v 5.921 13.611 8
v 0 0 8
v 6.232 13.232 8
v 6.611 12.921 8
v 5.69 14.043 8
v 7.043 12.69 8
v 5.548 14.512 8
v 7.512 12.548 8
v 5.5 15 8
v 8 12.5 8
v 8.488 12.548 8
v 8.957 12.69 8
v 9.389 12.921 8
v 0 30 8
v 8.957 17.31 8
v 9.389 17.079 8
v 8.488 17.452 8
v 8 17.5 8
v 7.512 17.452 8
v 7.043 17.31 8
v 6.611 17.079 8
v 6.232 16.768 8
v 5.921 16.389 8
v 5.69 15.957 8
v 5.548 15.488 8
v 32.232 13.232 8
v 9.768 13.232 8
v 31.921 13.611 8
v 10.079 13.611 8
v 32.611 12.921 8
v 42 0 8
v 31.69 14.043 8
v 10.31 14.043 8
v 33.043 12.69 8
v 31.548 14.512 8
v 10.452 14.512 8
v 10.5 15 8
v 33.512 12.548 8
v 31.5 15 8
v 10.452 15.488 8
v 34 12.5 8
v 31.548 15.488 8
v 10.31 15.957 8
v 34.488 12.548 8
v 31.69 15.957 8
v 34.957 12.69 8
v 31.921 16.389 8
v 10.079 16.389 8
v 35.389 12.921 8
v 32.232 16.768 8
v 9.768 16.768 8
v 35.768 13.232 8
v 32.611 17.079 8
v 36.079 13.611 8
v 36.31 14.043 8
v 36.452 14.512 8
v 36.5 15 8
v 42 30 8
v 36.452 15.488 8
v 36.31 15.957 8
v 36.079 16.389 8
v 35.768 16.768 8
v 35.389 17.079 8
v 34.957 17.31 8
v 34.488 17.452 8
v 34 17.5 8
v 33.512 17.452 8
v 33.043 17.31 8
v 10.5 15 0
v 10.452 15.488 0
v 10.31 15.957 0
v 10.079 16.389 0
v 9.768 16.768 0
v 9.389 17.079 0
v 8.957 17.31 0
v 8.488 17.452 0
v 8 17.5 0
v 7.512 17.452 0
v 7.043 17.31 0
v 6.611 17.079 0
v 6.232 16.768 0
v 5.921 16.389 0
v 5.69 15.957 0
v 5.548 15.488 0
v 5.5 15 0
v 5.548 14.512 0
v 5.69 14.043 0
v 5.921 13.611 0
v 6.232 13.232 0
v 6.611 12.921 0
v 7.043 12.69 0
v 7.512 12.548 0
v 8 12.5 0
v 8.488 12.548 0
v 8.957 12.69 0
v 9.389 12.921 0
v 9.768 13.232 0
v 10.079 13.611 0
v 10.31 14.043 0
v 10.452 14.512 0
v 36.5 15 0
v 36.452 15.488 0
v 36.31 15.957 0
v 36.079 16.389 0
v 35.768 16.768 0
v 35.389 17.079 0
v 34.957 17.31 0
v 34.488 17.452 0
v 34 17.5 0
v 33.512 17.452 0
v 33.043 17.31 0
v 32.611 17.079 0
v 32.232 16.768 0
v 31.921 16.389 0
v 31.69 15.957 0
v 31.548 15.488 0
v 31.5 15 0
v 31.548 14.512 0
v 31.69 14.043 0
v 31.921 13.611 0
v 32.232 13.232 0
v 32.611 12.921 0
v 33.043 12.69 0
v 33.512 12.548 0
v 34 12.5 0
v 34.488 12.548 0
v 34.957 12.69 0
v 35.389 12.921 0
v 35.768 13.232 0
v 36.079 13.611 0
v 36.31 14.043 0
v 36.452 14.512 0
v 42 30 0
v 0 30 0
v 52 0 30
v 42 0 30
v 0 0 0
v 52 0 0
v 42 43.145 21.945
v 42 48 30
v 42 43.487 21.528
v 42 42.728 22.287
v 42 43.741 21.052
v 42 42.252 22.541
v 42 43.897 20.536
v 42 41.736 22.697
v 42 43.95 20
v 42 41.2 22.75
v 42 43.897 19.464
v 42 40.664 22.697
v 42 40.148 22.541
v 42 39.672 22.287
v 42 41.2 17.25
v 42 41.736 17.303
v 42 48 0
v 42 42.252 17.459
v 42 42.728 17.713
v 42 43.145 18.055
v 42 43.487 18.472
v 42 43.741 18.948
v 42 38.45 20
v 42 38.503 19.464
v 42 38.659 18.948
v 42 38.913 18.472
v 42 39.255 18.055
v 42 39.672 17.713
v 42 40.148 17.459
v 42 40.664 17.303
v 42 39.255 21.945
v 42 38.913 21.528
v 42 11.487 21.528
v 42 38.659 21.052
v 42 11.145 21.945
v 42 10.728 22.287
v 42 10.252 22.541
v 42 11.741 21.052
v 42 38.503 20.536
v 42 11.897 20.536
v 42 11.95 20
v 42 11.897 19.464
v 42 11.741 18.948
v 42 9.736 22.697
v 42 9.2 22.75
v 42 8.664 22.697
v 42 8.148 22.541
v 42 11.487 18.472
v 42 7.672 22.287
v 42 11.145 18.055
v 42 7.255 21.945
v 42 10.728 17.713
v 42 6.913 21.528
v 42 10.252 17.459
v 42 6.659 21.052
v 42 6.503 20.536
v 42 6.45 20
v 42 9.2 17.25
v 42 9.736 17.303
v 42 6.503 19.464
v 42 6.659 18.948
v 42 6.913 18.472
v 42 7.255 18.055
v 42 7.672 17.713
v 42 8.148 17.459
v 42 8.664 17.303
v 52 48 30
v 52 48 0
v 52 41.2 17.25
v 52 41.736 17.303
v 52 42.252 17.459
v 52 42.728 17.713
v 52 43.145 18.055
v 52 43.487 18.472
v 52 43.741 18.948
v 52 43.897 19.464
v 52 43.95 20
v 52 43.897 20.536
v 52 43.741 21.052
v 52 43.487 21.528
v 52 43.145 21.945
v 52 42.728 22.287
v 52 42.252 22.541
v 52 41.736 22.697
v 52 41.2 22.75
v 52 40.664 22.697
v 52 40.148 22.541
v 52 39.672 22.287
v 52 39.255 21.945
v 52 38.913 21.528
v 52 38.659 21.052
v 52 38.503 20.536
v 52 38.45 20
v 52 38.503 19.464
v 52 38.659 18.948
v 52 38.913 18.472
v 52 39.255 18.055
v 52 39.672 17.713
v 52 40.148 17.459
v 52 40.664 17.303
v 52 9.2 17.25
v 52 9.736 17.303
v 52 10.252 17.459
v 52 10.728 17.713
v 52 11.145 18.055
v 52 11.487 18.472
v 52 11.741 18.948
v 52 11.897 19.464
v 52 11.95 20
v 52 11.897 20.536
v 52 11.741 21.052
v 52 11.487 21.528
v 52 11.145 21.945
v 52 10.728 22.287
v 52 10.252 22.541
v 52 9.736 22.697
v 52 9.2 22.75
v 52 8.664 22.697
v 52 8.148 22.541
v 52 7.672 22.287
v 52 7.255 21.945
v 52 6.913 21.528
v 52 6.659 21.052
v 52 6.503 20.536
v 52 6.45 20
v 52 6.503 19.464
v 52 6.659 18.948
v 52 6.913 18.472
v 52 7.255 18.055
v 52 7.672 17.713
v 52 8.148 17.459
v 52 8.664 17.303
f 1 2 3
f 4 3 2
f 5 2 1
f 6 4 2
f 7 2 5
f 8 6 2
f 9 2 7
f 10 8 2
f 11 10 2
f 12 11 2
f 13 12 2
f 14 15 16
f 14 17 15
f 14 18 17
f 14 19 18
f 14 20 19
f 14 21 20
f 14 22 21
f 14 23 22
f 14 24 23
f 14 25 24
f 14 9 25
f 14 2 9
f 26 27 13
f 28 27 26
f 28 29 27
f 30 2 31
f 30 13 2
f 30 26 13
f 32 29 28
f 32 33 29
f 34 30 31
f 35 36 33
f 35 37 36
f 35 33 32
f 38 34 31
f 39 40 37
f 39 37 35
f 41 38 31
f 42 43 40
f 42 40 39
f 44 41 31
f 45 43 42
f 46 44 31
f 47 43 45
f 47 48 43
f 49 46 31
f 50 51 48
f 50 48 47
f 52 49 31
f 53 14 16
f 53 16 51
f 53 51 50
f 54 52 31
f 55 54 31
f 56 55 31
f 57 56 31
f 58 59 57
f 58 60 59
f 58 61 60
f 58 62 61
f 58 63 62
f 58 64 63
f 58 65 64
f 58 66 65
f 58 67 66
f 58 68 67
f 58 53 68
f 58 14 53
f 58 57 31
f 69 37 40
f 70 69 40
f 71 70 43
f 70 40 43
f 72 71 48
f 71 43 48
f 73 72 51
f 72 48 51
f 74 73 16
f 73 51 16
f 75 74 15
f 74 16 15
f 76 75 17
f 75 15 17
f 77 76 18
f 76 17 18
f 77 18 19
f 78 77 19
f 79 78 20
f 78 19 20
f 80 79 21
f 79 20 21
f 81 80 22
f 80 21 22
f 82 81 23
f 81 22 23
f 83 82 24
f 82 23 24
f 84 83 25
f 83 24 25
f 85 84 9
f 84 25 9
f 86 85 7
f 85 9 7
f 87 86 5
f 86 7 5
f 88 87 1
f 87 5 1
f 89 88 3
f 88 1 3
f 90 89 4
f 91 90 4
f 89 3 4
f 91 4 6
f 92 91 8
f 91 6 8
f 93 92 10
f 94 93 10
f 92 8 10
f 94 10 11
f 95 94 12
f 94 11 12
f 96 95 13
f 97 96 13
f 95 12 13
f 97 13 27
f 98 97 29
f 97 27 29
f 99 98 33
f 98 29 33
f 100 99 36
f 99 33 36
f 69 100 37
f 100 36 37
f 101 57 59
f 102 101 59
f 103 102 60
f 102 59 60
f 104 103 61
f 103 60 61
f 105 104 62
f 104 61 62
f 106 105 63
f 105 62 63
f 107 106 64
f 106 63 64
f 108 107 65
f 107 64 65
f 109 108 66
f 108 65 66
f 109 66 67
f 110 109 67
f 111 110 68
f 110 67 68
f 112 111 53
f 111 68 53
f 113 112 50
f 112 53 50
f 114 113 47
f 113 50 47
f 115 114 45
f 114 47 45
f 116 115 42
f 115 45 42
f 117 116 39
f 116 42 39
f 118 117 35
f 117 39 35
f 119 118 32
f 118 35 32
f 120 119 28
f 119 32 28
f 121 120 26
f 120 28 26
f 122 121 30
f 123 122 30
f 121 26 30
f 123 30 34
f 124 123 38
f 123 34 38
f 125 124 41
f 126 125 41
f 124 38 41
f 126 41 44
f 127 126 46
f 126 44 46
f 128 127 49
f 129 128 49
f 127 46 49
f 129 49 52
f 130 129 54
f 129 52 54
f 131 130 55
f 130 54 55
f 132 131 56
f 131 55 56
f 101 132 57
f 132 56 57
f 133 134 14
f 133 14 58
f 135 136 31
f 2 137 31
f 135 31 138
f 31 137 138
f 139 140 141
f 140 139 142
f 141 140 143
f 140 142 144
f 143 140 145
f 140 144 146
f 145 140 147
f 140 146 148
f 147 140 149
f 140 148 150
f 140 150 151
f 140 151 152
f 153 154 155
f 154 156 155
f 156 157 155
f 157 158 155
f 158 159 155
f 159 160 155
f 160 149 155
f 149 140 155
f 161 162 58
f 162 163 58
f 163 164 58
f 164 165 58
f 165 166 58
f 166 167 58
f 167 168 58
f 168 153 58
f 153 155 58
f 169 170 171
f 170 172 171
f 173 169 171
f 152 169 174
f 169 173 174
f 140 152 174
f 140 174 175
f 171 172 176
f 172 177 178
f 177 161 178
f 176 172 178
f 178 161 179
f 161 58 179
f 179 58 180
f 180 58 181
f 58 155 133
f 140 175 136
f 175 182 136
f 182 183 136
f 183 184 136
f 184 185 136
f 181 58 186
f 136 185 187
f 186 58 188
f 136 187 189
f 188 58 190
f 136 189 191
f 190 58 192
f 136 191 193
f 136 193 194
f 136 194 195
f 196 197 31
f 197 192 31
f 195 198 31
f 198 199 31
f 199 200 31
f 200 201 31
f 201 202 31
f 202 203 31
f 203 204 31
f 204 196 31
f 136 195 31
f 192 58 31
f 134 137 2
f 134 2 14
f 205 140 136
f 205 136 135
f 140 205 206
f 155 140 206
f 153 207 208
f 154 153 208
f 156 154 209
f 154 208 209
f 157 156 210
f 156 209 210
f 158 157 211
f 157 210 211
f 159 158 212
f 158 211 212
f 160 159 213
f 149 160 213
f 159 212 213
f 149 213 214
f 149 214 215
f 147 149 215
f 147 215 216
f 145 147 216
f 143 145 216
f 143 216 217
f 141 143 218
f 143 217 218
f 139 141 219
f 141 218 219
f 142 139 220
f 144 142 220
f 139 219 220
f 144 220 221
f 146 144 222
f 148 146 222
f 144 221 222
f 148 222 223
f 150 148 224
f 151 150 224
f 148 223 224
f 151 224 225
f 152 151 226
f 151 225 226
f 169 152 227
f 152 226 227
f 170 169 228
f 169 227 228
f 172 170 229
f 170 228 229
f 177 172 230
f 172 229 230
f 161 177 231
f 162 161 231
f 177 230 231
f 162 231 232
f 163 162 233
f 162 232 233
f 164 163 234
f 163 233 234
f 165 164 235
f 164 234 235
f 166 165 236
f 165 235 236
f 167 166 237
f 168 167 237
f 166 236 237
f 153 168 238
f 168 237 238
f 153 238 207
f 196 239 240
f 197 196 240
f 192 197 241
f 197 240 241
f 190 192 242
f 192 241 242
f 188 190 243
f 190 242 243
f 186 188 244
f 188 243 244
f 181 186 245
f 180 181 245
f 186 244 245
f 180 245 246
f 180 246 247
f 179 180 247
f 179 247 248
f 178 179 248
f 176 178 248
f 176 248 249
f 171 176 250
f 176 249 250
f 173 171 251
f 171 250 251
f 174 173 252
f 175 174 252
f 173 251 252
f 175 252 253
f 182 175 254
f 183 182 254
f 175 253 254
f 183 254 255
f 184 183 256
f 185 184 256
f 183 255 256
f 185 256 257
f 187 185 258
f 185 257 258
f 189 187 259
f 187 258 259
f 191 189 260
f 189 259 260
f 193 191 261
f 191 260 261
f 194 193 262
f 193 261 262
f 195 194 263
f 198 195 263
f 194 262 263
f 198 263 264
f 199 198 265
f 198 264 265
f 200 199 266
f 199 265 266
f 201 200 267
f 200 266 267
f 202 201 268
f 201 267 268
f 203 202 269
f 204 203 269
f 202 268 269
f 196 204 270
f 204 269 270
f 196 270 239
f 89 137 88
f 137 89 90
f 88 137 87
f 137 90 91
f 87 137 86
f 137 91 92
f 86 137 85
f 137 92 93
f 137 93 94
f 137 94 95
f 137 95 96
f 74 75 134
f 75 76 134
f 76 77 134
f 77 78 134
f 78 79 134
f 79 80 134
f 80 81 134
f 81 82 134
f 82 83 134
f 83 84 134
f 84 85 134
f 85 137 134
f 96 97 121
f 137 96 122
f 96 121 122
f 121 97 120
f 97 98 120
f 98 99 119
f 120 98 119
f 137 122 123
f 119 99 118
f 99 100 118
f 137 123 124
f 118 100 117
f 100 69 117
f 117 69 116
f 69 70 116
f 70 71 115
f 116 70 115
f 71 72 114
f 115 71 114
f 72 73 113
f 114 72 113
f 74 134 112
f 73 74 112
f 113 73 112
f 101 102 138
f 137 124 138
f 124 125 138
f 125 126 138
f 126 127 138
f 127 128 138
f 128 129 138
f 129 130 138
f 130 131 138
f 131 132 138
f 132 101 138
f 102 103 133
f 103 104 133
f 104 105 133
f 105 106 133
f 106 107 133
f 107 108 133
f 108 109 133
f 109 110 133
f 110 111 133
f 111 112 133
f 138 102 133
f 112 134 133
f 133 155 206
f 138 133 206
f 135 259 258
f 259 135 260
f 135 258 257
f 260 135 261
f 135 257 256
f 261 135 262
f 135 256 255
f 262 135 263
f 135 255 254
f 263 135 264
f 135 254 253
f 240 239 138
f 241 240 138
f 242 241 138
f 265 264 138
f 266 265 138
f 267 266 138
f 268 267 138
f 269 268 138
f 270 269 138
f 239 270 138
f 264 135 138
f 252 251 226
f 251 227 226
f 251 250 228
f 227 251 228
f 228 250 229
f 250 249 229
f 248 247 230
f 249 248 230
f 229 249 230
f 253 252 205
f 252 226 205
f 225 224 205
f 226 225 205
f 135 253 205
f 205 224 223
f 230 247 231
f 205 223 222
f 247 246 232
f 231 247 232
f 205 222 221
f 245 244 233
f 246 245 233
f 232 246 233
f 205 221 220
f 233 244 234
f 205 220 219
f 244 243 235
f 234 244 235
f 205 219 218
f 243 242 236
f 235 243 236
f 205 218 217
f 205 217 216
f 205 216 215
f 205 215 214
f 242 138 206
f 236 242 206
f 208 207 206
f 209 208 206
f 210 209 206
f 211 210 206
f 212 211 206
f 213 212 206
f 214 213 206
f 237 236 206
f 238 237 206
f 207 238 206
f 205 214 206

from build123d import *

# Parameters (mm, degrees)
SKETCH1_W             = 42
SKETCH1_H             = 30
BOSS_EXTRUDE1_DEPTH   = 8
BOSS_EXTRUDE1_2_DEPTH = 8
BOSS_EXTRUDE2_DEPTH   = 30
SKETCH2_R             = 2.5
CUT_EXTRUDE1_DEPTH    = 8
SKETCH3_R             = 2.75
CUT_EXTRUDE2_DEPTH    = 10
SKETCH4_W             = 30
SKETCH4_H             = 100
CUT_EXTRUDE3_DEPTH    = 52


with BuildPart() as part:
    # Sketch1 → Boss-Extrude1 (new body)
    with BuildSketch(Plane.XY):
        with Locations((21, 133)):
            Rectangle(SKETCH1_W, SKETCH1_H)
    extrude(amount=BOSS_EXTRUDE1_DEPTH)



with BuildPart() as body_2:
    # Sketch1 → Boss-Extrude1 2 (new body)
    with BuildSketch(Plane.XY):
        with Locations((21, 15)):
            Rectangle(SKETCH1_W, SKETCH1_H)
    extrude(amount=BOSS_EXTRUDE1_2_DEPTH)


with BuildPart() as part_1:
    add(part.part)

    add(body_2.part)  # Boss-Extrude2 merges body 2
    # Sketch1<3> → Boss-Extrude2 (add)
    with BuildSketch(Plane.XY):
        Polygon((42, 30), (42, 0), (52, 0), (52, 148), (42, 148), (42, 118), align=None)
    extrude(amount=BOSS_EXTRUDE2_DEPTH)

    # Sketch2 → Cut-Extrude1 (cut)
    with BuildSketch(Plane.XY.offset(8)):
        with Locations((8, 133)):
            Circle(SKETCH2_R)
        with Locations((34, 133)):
            Circle(SKETCH2_R)
        with Locations((34, 15)):
            Circle(SKETCH2_R)
        with Locations((8, 15)):
            Circle(SKETCH2_R)
    extrude(amount=-CUT_EXTRUDE1_DEPTH, mode=Mode.SUBTRACT)

    # Sketch3 → Cut-Extrude2 (cut)
    with BuildSketch(Plane(origin=(52, 0, 0), x_dir=(0, 0, -1), z_dir=(1, 0, 0))):
        with Locations((-20, 138.3)):
            Circle(SKETCH3_R)
        with Locations((-20, 106.3)):
            Circle(SKETCH3_R)
        with Locations((-20, 41.2)):
            Circle(SKETCH3_R)
        with Locations((-20, 9.2)):
            Circle(SKETCH3_R)
    extrude(amount=-CUT_EXTRUDE2_DEPTH, mode=Mode.SUBTRACT)

    # Sketch4 → Cut-Extrude3 (cut)
    with BuildSketch(Plane(origin=(52, 0, 0), x_dir=(0, 0, -1), z_dir=(1, 0, 0))):
        with Locations((-15, 98)):
            Rectangle(SKETCH4_W, SKETCH4_H)
    extrude(amount=-CUT_EXTRUDE3_DEPTH, mode=Mode.SUBTRACT)


solid = part_1.part
